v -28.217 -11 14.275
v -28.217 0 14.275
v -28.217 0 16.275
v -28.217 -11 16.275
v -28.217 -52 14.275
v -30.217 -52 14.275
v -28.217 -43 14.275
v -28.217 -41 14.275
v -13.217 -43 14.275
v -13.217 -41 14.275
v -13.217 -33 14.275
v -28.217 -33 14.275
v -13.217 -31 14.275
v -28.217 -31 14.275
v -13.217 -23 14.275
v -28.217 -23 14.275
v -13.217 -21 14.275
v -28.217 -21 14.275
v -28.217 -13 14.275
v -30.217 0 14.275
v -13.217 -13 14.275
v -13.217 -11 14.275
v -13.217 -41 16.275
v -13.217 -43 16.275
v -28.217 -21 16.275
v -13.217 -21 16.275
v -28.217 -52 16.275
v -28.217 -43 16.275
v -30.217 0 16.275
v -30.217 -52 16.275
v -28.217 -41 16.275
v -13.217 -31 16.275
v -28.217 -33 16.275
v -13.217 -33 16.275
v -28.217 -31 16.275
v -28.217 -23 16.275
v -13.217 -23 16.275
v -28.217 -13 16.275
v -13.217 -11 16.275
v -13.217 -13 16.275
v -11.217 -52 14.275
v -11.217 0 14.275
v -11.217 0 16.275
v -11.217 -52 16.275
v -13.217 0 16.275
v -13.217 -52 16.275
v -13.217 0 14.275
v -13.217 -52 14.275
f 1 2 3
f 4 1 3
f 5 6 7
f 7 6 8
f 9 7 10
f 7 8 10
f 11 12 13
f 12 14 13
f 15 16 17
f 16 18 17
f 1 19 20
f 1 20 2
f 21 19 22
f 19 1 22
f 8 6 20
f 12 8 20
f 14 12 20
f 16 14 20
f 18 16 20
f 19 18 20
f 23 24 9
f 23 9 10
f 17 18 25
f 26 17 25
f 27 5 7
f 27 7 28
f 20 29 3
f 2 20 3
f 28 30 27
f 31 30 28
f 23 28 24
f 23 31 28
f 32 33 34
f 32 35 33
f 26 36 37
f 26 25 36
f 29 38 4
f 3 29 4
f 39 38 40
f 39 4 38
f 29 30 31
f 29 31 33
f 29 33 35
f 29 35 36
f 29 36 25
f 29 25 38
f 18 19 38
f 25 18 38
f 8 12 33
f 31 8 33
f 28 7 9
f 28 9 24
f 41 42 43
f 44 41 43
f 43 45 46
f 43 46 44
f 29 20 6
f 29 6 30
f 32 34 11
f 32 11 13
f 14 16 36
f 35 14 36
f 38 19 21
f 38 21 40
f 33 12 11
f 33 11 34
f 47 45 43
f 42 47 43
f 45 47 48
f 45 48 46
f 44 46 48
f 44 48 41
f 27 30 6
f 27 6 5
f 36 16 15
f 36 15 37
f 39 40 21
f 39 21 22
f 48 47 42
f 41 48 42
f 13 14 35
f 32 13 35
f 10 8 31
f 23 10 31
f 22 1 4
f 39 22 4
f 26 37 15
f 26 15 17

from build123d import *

# Parameters (mm, degrees)
F0_W     = 2
F0_H     = 2
F1_DEPTH = 52
F2_W     = 2
F2_H     = 2
F3_DEPTH = 15


with BuildPart() as f1:
    # F0 (on Front) → F1 (new body)
    with BuildSketch(Plane.XZ):
        with Locations((-29.2174071148, 15.274727294)):
            Rectangle(F0_W, F0_H)
    extrude(amount=F1_DEPTH)

    # F2 (on face) → F3 (join)
    with BuildSketch(Plane.YZ.offset(-28.2174071148)):
        with Locations((-42, 15.274727294)):
            Rectangle(F2_W, F2_H)
        with Locations((-32, 15.274727294)):
            Rectangle(F2_W, F2_H)
        with Locations((-22, 15.274727294)):
            Rectangle(F2_W, F2_H)
        with Locations((-12, 15.274727294)):
            Rectangle(F2_W, F2_H)
    extrude(amount=F3_DEPTH)


with BuildPart() as f1b:
    # F0 (on Front) → F1, piece 2 (new body)
    with BuildSketch(Plane.XZ):
        with Locations((-12.2174071148, 15.274727294)):
            Rectangle(F0_W, F0_H)
    extrude(amount=F1_DEPTH)


solid = Compound([f1.part, f1b.part])
